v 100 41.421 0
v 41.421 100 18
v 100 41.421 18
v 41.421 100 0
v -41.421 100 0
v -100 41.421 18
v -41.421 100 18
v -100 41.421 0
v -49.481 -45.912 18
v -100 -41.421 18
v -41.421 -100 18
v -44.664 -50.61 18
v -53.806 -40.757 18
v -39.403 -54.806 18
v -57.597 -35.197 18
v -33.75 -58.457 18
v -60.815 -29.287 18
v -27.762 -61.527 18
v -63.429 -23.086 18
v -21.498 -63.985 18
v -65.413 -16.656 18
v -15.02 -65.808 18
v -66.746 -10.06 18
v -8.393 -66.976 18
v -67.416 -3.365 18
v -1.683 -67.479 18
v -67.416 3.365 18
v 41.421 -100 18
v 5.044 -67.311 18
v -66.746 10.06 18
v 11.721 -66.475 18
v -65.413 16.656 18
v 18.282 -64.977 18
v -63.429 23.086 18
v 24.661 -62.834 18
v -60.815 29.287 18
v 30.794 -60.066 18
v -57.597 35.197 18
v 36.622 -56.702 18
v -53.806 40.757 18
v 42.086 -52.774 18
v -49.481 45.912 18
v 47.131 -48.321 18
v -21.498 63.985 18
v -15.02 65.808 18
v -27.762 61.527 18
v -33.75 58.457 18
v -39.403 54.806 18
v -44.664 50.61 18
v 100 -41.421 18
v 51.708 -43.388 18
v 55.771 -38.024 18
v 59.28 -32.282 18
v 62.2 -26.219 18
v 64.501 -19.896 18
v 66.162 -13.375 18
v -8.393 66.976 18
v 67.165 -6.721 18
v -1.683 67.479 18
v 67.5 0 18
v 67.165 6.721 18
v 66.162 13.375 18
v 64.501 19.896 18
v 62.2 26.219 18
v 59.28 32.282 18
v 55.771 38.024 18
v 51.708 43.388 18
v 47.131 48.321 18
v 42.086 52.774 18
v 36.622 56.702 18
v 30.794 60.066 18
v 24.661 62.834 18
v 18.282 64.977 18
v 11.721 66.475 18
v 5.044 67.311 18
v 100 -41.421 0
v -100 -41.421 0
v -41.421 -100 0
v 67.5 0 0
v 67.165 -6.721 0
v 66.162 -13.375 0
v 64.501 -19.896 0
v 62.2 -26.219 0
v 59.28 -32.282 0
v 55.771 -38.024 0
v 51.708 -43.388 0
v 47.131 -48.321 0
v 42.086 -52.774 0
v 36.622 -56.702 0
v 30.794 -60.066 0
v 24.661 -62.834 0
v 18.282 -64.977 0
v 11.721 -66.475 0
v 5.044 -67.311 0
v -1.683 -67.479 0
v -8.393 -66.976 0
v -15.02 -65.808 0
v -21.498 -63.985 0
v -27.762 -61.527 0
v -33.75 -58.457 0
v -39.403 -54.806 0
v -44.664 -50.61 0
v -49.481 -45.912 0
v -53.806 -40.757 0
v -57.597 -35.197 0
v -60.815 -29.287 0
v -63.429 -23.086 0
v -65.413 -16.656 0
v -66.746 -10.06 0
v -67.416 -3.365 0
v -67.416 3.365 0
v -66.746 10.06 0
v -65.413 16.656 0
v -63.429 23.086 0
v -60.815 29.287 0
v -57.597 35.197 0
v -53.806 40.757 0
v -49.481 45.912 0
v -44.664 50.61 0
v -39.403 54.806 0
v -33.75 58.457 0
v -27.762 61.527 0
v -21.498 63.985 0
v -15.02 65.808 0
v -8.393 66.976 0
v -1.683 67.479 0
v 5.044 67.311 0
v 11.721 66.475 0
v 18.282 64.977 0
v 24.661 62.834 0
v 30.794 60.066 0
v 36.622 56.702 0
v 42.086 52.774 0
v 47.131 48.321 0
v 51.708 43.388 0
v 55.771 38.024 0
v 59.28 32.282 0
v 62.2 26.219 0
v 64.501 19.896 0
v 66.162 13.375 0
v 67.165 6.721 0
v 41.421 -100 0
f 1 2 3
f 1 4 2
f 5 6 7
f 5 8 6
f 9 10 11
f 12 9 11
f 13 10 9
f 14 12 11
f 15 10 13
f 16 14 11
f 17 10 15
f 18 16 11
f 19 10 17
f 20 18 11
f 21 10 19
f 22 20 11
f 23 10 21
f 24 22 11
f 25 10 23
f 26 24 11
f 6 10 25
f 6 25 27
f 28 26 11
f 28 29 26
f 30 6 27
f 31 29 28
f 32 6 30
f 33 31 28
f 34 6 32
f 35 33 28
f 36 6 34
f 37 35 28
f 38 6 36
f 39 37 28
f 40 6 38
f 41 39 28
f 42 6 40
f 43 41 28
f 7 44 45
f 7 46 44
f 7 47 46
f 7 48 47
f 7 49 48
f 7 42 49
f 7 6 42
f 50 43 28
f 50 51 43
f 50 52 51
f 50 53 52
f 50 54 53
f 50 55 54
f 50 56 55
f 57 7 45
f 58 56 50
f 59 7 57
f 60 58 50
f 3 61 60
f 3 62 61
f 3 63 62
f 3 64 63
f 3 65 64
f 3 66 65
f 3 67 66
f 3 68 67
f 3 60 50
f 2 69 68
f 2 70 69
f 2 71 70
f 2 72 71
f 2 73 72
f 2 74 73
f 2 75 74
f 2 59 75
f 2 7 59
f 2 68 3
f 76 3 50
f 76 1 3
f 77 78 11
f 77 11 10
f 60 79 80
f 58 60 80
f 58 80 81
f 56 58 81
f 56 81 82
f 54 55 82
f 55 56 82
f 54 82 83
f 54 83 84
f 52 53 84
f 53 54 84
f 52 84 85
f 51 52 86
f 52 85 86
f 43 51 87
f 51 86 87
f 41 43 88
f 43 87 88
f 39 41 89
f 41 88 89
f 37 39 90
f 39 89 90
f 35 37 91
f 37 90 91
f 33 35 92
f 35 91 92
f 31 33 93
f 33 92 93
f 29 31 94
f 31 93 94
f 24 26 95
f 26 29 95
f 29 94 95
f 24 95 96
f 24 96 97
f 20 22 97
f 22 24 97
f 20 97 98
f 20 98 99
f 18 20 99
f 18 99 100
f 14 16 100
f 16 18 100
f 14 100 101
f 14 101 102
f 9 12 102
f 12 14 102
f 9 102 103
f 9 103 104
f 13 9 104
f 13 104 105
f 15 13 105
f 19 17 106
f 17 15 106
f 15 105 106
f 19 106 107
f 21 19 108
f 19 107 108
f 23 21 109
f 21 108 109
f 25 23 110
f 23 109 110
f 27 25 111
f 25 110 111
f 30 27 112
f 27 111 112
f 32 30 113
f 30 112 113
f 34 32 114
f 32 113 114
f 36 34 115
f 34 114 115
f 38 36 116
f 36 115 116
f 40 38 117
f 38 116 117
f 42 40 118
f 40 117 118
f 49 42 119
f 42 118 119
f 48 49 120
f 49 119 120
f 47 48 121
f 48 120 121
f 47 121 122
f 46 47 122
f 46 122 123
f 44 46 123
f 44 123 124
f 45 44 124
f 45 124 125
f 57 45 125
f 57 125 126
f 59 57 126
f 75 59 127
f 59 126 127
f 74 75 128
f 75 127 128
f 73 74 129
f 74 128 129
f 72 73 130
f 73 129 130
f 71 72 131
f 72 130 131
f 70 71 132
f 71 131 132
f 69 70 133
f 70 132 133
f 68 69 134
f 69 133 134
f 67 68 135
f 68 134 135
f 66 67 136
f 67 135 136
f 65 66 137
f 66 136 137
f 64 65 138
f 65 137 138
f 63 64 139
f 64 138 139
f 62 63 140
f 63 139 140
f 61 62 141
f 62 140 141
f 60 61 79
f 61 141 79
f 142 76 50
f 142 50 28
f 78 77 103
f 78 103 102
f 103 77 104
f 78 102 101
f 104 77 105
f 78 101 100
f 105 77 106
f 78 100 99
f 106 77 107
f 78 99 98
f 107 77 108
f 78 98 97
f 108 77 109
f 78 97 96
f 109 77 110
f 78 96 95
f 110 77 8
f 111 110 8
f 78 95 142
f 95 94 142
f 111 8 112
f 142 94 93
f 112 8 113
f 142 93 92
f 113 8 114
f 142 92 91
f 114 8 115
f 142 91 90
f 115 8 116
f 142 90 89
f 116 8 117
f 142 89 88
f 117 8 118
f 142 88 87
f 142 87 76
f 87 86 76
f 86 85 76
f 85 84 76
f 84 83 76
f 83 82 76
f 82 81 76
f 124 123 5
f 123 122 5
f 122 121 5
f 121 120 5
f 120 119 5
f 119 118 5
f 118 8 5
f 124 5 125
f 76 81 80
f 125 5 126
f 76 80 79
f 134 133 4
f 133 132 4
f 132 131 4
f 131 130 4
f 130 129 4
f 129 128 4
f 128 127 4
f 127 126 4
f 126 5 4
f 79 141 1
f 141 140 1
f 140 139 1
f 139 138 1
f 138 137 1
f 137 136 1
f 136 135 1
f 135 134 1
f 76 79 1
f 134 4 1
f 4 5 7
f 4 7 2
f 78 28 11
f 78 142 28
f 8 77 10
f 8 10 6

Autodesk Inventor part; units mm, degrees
ref_plane "YZ Plane" through (0, 0, 0) normal (1, 0, 0) x (0, 1, 0)
ref_plane "XZ Plane" through (0, 0, 0) normal (0, 1, 0) x (-1, 0, 0)
ref_plane "XY Plane" through (0, 0, 0) normal (0, 0, 1) x (1, 0, 0)
sketch "Skizze2" plane through (0, 0, 0) normal (0, 0, 1) x (1, 0, 0)
  circle A0 centre (0, 0) radius 67.5
  line L0 (-41.4214, 100) -> (41.4214, 100)
  line L1 (41.4214, 100) -> (100, 41.4214)
  line L2 (100, 41.4214) -> (100, -41.4214)
  line L3 (100, -41.4214) -> (41.4214, -100)
  line L4 (41.4214, -100) -> (-41.4214, -100)
  line L5 (-41.4214, -100) -> (-100, -41.4214)
  line L6 (-100, -41.4214) -> (-100, 41.4214)
  line L7 (-100, 41.4214) -> (-41.4214, 100)
  dimension "d7" = 135
  dimension "d11" = 200
extrude "Extrusion2" add sketch "Skizze2" along normal blind 18
equation "\"kg_thickness\" = 4.9"
equation "\"ht_thickness\" = 1.9"
equation "\"case_thickness\" = 18"
equation "\"inner_thickness\" = 15"
equation "\"gap_fit\" = 0.1"
equation "\"gap_slide\" = 0.2"
equation "\"gap_air\" = 1"
equation "\"bore_diameter\" = 73"
equation "\"mdf_thickness\" = 6"
equation "\"tape_width\" = 15"
equation "\"tape_thickness\" = 3"
equation "\"inner_depth\" = 255"
properties part number "Korpus_Motor_18mm"
